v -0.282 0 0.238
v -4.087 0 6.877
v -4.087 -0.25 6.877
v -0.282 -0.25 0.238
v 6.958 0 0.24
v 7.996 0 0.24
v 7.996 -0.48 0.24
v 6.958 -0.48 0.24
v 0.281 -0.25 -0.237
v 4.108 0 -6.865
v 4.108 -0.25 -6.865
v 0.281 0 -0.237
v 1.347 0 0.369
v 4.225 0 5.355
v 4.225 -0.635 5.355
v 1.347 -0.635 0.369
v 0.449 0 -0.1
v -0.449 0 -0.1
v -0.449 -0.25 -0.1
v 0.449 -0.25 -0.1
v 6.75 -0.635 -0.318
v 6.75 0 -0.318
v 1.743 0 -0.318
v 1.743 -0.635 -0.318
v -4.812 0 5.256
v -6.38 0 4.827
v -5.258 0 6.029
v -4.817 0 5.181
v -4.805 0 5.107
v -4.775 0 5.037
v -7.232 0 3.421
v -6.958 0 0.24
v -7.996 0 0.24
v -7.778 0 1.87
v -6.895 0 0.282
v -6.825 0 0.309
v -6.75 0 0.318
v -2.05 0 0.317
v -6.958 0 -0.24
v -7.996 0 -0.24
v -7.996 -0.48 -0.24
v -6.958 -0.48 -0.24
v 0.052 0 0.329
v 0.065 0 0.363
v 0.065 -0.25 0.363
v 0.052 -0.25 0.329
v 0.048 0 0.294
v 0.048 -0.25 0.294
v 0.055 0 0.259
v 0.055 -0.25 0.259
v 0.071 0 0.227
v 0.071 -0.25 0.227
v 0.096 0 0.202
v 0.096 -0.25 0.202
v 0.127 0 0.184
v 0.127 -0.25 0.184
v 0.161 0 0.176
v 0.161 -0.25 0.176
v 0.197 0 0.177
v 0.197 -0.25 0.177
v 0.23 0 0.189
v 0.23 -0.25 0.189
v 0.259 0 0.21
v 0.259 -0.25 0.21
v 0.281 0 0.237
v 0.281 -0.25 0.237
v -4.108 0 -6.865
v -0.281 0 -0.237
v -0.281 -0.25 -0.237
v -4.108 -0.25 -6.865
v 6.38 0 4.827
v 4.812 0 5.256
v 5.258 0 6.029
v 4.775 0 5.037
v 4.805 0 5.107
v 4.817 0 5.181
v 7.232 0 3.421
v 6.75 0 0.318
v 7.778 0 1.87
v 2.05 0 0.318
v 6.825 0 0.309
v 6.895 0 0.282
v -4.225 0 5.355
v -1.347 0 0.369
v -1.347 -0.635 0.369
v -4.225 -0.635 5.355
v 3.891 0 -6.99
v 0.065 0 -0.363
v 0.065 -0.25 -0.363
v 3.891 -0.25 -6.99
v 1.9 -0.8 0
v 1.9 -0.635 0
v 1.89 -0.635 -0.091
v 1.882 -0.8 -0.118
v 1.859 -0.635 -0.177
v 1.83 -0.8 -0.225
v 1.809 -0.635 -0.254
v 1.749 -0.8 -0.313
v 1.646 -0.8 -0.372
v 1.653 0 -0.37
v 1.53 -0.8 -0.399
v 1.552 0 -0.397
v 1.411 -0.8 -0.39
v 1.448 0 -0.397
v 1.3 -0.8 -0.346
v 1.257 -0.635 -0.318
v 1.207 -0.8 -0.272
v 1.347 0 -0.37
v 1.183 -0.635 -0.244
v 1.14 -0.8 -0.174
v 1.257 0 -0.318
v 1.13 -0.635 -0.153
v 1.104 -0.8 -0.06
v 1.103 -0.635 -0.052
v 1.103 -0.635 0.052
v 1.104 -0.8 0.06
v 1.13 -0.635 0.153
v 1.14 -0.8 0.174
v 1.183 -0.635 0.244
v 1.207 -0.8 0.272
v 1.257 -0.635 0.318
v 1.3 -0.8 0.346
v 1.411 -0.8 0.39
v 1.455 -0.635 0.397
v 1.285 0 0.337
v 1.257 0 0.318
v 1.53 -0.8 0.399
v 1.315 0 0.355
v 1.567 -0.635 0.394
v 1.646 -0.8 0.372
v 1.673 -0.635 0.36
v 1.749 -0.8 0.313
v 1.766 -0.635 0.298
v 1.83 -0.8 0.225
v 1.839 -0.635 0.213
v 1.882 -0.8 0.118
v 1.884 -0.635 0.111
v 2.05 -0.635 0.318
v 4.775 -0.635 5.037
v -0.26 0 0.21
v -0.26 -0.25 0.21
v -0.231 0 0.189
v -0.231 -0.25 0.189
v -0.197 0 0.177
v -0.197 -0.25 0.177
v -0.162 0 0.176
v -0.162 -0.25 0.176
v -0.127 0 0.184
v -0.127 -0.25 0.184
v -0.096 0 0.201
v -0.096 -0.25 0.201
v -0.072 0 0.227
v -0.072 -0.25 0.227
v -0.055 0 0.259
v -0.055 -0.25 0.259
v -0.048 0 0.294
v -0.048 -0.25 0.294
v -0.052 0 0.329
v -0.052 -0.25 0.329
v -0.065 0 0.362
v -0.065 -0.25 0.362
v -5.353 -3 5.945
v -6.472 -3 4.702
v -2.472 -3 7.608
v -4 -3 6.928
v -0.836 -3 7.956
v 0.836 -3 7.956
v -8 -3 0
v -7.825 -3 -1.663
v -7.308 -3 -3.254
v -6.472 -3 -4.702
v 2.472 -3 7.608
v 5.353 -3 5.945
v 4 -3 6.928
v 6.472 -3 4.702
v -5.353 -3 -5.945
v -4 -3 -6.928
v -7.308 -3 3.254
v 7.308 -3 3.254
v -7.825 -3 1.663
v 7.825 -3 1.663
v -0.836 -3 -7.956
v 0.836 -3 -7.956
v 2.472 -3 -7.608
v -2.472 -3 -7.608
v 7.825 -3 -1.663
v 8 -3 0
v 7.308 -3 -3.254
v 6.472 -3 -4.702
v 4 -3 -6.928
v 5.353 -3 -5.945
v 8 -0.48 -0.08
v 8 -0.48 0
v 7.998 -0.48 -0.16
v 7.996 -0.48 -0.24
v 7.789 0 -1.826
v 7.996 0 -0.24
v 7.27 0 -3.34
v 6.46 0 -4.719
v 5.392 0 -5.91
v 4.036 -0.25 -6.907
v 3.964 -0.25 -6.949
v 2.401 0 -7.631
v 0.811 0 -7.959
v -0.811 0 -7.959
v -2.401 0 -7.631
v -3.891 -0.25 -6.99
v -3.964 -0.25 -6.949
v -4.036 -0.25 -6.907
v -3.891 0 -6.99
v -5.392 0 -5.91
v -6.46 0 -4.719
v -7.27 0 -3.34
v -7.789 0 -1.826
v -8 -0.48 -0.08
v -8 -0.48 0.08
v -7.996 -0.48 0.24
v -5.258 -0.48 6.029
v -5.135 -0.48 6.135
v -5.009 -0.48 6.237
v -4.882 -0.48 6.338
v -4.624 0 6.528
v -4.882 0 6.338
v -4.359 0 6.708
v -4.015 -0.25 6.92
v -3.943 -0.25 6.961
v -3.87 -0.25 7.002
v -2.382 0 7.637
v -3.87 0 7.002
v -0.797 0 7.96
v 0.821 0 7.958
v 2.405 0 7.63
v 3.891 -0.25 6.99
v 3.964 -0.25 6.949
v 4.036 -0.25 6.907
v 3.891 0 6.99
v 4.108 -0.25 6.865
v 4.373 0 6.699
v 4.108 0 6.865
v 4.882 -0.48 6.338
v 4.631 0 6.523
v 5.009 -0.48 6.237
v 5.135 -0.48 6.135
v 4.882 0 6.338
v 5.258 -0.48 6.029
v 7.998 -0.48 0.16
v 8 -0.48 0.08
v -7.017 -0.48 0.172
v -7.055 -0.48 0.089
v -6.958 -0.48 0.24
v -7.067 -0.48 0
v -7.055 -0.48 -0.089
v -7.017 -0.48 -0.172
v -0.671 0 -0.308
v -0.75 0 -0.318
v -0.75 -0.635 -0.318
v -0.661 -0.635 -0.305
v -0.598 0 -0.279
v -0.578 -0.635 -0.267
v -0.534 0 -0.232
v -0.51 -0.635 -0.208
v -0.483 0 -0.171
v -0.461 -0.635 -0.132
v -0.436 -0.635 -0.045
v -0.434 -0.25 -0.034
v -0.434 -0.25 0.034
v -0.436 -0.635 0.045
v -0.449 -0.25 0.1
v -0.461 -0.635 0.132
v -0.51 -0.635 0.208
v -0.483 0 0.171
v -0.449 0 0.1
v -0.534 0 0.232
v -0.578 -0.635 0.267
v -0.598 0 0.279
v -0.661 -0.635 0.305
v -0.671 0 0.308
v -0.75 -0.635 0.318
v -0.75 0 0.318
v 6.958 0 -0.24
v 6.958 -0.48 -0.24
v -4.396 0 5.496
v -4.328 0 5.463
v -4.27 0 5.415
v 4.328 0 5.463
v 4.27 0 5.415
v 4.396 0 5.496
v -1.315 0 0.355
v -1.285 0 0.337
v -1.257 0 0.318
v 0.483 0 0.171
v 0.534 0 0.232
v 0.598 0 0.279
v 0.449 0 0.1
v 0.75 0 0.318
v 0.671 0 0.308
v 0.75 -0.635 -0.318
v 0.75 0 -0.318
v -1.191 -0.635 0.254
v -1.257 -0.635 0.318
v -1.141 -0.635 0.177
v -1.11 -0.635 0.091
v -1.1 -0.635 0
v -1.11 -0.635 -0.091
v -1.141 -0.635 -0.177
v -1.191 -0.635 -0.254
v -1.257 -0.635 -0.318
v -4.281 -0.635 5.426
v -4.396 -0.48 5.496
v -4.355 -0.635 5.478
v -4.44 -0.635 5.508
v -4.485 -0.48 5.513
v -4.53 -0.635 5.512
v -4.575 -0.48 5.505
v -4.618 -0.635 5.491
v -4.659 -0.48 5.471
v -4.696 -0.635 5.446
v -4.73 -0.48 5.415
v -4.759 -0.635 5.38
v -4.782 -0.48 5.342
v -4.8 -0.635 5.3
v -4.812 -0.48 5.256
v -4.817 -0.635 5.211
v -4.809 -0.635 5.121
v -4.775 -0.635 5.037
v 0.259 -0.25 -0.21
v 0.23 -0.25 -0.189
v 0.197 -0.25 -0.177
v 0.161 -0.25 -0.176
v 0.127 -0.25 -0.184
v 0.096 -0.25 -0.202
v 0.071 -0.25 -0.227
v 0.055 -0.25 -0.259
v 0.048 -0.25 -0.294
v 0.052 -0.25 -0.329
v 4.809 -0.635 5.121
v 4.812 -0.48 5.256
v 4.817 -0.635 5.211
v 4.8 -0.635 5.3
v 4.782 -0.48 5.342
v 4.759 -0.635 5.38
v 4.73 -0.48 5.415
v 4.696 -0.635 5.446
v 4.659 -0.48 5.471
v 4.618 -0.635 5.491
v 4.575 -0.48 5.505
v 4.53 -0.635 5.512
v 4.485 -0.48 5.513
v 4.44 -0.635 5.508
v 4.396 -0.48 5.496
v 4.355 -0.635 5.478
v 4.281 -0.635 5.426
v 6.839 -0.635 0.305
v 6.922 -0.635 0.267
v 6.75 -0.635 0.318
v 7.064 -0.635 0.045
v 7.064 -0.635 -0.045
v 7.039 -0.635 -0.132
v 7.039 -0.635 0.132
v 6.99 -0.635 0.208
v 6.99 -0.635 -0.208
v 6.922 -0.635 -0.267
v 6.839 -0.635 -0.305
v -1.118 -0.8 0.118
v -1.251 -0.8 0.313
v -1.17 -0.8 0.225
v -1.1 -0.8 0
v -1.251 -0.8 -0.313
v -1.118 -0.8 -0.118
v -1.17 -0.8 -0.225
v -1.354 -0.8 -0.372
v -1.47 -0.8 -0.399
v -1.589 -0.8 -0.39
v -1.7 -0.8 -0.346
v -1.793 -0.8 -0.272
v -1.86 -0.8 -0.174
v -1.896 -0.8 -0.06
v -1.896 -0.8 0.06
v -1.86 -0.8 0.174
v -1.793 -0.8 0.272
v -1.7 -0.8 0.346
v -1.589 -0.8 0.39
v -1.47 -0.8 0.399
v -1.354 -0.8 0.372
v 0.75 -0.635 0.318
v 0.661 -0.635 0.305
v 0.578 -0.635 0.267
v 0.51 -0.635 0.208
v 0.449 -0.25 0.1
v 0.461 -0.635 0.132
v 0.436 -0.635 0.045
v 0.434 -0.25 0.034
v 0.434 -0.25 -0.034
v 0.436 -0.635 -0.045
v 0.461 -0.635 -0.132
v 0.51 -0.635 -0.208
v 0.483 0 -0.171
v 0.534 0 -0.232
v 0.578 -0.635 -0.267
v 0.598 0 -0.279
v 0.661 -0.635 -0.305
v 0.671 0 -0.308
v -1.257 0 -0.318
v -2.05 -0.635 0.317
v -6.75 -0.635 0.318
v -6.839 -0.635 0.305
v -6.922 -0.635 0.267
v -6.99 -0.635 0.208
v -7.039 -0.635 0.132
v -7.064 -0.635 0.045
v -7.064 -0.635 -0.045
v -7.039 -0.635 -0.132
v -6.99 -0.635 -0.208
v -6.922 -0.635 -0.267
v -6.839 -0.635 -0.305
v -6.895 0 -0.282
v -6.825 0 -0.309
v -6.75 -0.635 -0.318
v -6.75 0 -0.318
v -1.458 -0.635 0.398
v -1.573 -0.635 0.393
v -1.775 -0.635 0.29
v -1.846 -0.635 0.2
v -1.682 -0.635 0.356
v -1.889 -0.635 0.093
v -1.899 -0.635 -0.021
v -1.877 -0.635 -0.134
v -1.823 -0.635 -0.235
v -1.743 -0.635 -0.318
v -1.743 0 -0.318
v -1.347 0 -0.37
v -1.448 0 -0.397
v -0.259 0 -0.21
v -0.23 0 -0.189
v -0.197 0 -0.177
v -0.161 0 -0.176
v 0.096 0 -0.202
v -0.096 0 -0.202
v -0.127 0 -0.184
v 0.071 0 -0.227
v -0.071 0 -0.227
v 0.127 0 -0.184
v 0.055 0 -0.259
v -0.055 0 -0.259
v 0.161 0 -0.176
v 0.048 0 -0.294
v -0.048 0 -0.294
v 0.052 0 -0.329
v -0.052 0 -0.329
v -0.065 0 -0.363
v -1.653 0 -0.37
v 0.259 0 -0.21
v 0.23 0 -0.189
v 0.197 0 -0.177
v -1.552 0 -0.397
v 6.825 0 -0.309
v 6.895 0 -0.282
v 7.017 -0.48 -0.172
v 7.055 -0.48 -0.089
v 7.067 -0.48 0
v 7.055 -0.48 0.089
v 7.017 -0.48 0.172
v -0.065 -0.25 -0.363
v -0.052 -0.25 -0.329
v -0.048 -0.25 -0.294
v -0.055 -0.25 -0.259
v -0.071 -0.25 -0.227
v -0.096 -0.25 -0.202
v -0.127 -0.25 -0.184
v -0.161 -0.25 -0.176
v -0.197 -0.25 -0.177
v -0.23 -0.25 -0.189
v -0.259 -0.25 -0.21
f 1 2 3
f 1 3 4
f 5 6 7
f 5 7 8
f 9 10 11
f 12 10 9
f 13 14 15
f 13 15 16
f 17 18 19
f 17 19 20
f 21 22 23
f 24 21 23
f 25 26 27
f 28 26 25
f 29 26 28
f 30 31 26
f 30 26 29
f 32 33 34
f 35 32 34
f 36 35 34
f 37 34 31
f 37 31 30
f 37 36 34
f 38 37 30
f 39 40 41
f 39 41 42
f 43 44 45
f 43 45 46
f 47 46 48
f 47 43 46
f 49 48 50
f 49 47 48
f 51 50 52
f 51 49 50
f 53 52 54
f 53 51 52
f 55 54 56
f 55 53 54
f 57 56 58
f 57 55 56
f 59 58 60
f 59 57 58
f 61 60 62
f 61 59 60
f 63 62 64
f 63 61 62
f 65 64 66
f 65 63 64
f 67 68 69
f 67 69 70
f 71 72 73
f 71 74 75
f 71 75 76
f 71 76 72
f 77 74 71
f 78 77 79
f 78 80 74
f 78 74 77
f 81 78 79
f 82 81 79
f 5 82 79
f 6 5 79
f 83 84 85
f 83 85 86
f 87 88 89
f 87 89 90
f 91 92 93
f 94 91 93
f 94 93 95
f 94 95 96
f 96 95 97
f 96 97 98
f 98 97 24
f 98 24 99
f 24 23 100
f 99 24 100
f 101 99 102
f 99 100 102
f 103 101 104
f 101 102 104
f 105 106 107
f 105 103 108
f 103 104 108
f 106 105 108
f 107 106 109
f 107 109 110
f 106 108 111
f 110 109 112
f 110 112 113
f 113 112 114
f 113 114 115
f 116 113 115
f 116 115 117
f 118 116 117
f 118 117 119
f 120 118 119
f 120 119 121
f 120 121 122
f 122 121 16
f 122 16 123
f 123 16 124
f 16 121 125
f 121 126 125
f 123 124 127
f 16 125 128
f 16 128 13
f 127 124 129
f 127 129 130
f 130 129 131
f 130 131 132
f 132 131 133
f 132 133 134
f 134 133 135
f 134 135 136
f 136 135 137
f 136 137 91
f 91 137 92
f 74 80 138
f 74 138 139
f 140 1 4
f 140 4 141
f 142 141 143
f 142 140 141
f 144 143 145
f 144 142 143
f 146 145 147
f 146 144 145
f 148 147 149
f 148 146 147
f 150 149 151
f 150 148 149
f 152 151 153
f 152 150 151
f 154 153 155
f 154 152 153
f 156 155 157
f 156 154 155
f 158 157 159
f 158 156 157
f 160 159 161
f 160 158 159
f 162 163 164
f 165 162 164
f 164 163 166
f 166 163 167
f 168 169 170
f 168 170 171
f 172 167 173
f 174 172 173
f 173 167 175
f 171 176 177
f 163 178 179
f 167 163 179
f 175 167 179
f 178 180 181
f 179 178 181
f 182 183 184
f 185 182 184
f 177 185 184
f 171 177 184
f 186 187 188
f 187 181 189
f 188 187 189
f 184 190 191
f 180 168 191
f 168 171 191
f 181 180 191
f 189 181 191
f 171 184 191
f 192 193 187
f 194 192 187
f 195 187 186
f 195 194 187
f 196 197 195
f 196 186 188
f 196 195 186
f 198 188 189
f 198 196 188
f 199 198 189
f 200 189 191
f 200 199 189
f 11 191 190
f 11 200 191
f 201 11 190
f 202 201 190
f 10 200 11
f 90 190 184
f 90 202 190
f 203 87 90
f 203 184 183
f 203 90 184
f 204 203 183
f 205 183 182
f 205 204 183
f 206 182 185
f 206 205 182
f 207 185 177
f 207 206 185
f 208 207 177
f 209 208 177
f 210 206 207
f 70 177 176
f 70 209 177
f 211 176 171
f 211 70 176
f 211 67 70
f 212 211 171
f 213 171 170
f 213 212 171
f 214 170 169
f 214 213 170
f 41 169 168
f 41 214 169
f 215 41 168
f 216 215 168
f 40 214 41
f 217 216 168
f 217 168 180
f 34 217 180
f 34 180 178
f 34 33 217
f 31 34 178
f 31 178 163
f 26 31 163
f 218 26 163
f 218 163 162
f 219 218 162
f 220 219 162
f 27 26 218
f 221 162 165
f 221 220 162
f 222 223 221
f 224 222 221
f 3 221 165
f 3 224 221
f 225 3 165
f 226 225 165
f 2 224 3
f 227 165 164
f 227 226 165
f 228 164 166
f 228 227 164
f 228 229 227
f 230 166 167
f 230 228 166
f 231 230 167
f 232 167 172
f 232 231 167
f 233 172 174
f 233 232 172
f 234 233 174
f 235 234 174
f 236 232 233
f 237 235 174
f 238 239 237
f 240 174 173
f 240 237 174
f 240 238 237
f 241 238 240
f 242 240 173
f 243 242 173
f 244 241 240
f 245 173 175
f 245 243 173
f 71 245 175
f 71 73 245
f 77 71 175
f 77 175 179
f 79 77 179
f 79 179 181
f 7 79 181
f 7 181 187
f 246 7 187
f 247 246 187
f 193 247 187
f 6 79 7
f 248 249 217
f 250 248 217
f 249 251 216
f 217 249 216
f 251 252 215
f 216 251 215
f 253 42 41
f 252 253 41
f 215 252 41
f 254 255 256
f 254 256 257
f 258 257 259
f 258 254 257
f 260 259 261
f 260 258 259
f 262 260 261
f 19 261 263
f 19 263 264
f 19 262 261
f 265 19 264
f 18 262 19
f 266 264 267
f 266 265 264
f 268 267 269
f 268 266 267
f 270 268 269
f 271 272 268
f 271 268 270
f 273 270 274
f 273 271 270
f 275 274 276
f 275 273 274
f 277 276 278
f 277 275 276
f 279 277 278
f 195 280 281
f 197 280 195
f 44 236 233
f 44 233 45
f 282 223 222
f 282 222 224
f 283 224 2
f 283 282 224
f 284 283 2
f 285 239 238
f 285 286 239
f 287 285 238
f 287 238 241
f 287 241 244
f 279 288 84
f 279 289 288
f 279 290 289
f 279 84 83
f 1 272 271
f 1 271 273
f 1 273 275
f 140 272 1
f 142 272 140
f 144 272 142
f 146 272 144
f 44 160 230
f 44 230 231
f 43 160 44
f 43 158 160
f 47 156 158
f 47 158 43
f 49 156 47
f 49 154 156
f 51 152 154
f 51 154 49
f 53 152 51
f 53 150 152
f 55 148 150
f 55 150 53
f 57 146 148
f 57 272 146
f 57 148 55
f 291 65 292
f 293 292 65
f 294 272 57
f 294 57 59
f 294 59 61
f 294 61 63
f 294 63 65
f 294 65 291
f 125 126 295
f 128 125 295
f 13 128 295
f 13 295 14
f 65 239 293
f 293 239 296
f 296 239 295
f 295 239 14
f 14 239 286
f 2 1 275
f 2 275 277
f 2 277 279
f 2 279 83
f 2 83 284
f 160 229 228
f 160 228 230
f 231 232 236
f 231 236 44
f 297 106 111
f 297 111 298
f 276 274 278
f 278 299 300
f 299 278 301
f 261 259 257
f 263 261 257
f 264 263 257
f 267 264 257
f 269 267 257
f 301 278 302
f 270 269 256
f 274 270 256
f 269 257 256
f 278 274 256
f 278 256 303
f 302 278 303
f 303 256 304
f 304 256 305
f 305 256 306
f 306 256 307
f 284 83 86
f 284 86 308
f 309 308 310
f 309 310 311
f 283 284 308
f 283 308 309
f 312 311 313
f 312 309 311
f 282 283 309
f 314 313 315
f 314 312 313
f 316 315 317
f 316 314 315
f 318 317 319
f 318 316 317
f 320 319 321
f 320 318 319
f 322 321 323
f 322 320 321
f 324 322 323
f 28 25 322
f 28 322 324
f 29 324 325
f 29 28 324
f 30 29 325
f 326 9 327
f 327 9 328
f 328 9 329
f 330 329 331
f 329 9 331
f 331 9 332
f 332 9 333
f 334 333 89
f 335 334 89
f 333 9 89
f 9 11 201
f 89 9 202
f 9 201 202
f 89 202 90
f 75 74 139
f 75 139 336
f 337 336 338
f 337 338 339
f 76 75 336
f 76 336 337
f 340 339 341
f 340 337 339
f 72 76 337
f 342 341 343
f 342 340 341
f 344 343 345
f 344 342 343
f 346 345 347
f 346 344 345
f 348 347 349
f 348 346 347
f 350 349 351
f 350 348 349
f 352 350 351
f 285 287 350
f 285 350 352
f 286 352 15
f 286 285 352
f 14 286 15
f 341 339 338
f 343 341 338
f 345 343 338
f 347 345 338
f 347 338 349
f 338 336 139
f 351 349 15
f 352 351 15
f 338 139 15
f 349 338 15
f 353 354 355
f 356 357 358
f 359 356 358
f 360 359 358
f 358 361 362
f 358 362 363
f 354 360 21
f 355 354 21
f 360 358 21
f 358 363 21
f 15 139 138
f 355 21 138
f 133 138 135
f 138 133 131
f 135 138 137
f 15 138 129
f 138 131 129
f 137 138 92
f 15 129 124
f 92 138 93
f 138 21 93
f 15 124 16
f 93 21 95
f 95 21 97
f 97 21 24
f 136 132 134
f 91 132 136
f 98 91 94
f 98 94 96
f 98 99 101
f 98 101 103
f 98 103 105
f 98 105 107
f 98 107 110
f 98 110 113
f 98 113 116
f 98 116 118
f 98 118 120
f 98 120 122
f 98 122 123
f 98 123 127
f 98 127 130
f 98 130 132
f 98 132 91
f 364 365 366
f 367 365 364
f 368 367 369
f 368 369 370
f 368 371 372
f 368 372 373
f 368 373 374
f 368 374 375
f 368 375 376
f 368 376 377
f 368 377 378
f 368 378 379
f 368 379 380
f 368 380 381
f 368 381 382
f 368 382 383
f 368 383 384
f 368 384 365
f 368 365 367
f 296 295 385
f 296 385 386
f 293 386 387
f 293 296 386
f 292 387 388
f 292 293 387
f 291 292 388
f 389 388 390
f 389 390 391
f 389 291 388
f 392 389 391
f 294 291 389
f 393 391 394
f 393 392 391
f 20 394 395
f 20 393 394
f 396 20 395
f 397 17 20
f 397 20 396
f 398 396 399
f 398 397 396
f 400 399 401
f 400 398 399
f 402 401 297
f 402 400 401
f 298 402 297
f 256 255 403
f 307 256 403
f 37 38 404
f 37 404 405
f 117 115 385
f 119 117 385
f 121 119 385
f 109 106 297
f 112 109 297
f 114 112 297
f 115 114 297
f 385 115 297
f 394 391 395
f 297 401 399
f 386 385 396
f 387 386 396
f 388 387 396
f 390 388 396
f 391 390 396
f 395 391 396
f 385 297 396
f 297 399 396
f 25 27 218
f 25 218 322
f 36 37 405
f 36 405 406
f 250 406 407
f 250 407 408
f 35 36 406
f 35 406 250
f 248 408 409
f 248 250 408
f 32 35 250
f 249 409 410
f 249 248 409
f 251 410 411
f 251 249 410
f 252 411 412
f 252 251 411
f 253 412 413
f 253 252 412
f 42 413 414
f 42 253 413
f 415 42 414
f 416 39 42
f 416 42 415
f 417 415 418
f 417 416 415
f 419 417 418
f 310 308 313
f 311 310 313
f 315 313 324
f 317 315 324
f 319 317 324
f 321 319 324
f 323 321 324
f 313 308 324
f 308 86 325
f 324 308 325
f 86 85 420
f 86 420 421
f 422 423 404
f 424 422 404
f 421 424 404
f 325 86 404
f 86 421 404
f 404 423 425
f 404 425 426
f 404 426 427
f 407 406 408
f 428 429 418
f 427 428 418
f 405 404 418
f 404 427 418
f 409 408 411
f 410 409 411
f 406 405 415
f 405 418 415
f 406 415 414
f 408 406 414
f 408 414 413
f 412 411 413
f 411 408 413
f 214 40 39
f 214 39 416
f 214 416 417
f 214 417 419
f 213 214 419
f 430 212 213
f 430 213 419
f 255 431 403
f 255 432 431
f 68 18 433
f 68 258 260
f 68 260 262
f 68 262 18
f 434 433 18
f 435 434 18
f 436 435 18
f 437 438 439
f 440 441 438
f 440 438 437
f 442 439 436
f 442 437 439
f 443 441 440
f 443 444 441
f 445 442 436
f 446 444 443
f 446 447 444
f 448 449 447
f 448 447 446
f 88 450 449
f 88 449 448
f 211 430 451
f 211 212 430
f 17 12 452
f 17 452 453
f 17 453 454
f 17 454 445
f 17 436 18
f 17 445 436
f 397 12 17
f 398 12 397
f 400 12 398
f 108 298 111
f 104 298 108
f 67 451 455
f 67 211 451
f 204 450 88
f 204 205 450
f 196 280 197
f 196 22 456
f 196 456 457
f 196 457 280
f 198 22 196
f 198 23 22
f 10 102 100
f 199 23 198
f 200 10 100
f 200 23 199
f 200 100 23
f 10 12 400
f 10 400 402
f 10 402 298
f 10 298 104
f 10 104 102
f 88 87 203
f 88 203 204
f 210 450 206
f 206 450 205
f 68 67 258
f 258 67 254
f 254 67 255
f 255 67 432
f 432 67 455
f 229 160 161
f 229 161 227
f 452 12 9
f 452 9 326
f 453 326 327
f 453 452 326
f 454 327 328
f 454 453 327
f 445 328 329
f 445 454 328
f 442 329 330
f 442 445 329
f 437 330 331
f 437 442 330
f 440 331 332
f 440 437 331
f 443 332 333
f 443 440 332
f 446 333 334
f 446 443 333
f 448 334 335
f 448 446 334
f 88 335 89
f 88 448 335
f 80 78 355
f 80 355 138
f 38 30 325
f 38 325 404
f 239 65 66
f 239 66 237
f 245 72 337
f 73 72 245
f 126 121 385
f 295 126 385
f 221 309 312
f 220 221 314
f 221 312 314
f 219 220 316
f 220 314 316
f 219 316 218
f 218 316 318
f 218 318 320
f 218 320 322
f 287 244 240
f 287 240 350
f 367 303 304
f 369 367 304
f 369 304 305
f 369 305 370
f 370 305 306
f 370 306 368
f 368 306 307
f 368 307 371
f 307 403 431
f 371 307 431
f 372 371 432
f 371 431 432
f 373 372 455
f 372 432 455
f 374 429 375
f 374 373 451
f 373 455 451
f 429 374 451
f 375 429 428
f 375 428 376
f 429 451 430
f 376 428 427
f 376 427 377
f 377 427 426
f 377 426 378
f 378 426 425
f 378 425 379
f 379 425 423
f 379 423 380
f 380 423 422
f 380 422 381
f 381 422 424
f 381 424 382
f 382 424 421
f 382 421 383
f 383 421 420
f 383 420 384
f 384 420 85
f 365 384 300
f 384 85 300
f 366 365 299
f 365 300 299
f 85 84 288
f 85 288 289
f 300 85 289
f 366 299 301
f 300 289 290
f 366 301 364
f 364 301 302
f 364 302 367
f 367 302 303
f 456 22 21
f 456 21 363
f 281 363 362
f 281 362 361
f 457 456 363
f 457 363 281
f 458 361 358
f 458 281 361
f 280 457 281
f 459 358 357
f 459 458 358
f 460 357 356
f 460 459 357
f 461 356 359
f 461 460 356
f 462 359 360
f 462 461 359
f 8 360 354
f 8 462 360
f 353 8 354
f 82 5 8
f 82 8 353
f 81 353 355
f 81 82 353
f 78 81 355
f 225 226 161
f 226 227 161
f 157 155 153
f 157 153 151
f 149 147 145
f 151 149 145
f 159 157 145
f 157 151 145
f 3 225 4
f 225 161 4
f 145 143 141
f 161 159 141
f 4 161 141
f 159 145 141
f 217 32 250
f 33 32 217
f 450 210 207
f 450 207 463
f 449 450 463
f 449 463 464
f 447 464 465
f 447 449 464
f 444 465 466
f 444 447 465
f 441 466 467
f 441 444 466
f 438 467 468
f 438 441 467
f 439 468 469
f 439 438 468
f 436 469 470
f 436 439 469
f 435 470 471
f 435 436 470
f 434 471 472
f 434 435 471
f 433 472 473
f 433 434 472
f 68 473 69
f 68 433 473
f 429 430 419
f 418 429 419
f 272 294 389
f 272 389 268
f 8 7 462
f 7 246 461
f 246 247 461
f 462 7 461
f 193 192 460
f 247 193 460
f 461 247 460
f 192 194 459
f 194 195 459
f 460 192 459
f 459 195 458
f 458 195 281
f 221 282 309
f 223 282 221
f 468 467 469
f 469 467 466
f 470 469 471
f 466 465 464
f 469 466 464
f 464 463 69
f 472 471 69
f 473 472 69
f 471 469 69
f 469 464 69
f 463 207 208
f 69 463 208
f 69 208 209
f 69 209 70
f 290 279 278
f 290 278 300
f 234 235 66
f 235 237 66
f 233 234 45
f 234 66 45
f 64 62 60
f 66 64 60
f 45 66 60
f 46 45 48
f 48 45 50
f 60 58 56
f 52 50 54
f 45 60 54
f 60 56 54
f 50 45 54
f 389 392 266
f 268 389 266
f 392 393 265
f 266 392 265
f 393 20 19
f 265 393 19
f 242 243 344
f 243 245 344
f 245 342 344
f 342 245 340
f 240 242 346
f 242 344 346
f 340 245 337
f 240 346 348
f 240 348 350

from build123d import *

# Parameters (mm, degrees)
SKETCH1_R           = 8
BOSS_EXTRUDE1_DEPTH = 3
CUT_EXTRUDE1_DEPTH  = 0.25
SKETCH3_R           = 0.4
CUT_EXTRUDE2_DEPTH  = 0.8
CUT_EXTRUDE4_DEPTH  = 0.635
CUT_EXTRUDE6_DEPTH  = 0.48


with BuildPart() as part:
    # Sketch1 → Boss-Extrude1 (new body)
    with BuildSketch(Plane(origin=(0, 0, 0), x_dir=(1, 0, 0), z_dir=(0, 1, 0))):
        Circle(SKETCH1_R)
    extrude(amount=-BOSS_EXTRUDE1_DEPTH)

    # Sketch2 → Cut-Extrude1 (cut)
    with BuildSketch(Plane(origin=(0, 0, 0), x_dir=(1, 0, 0), z_dir=(0, 1, 0))):
        with BuildLine():
            Line((-0.75, 0.1), (0.75, 0.1))
            ThreePointArc((0.75, 0.1), (0.85, 0), (0.75, -0.1))
            Line((0.75, -0.1), (-0.75, -0.1))
            ThreePointArc((-0.75, -0.1), (-0.85, 0), (-0.75, 0.1))
        make_face()
        with BuildLine():
            Line((0.064947675, 0.362501474), (4.891747675, 8.722501474))
            ThreePointArc((4.891747675, 8.722501474), (5.062501474, 8.768252325), (5.108252325, 8.597498526))
            Line((5.108252325, 8.597498526), (0.281452325, 0.237498526))
            ThreePointArc((0.281452325, 0.237498526), (0.110698526, 0.191747675), (0.064947675, 0.362501474))
        make_face()
        with BuildLine():
            Line((0.281452325, -0.237498526), (5.108252325, -8.597498526))
            ThreePointArc((5.108252325, -8.597498526), (5.062501474, -8.768252325), (4.891747675, -8.722501474))
            Line((4.891747675, -8.722501474), (0.064947675, -0.362501474))
            ThreePointArc((0.064947675, -0.362501474), (0.110698526, -0.191747675), (0.281452325, -0.237498526))
        make_face()
        with BuildLine():
            Line((-0.064747026, -0.362152654), (-4.891547026, -8.784654127))
            ThreePointArc((-4.891547026, -8.784654127), (-5.062152654, -8.830954448), (-5.108452974, -8.66034882))
            Line((-5.108452974, -8.66034882), (-0.281652974, -0.237847346))
            ThreePointArc((-0.281652974, -0.237847346), (-0.111047346, -0.191547026), (-0.064747026, -0.362152654))
        make_face()
        with BuildLine():
            Line((-0.281452325, 0.237498526), (-5.108252325, 8.597498526))
            ThreePointArc((-5.108252325, 8.597498526), (-5.062501474, 8.768252325), (-4.891747675, 8.722501474))
            Line((-4.891747675, 8.722501474), (-0.064947675, 0.362501474))
            ThreePointArc((-0.064947675, 0.362501474), (-0.110698526, 0.191747675), (-0.281452325, 0.237498526))
        make_face()
    extrude(amount=-CUT_EXTRUDE1_DEPTH, mode=Mode.SUBTRACT)

    # Sketch3 → Cut-Extrude2 (cut)
    with BuildSketch(Plane(origin=(0, 0, 0), x_dir=(1, 0, 0), z_dir=(0, 1, 0))):
        with Locations((1.5, 0)):
            Circle(SKETCH3_R)
        with Locations((-1.5, 0)):
            Circle(SKETCH3_R)
    extrude(amount=-CUT_EXTRUDE2_DEPTH, mode=Mode.SUBTRACT)

    # Sketch4 → Cut-Extrude4 (cut)
    with BuildSketch(Plane(origin=(0, 0, 0), x_dir=(1, 0, 0), z_dir=(0, 1, 0))):
        with BuildLine():
            Line((-0.75, -0.3175), (-6.75, -0.3175))
            ThreePointArc((-6.75, -0.3175), (-7.0675, 0), (-6.75, 0.3175))
            Line((-6.75, 0.3175), (-0.75, 0.3175))
            ThreePointArc((-0.75, 0.3175), (-0.4325, 0), (-0.75, -0.3175))
        make_face()
        with BuildLine():
            Line((0.75, 0.3175), (6.75, 0.3175))
            ThreePointArc((6.75, 0.3175), (7.0675, 0), (6.75, -0.3175))
            Line((6.75, -0.3175), (0.75, -0.3175))
            ThreePointArc((0.75, -0.3175), (0.4325, 0), (0.75, 0.3175))
        make_face()
        with BuildLine():
            Line((-1.225038951, -0.158753493), (-4.225104953, -5.354867808))
            ThreePointArc((-4.225104953, -5.354867808), (-4.658819495, -5.471075365), (-4.775027051, -5.037360823))
            Line((-4.775027051, -5.037360823), (-1.774961049, 0.158753493))
            ThreePointArc((-1.774961049, 0.158753493), (-1.341246507, 0.274961049), (-1.225038951, -0.158753493))
        make_face()
        with BuildLine():
            Line((1.774961049, 0.158753493), (4.775027051, -5.037360823))
            ThreePointArc((4.775027051, -5.037360823), (4.658819495, -5.471075365), (4.225104953, -5.354867808))
            Line((4.225104953, -5.354867808), (1.225038951, -0.158753493))
            ThreePointArc((1.225038951, -0.158753493), (1.341246507, 0.274961049), (1.774961049, 0.158753493))
        make_face()
    extrude(amount=-CUT_EXTRUDE4_DEPTH, mode=Mode.SUBTRACT)

    # Sketch5 → Cut-Extrude6 (cut)
    with BuildSketch(Plane(origin=(0, 0, 0), x_dir=(1, 0, 0), z_dir=(0, 1, 0))):
        with BuildLine():
            Line((-6.75, -0.24), (-8.75, -0.24))
            ThreePointArc((-8.75, -0.24), (-8.99, 0), (-8.75, 0.24))
            Line((-8.75, 0.24), (-6.75, 0.24))
            ThreePointArc((-6.75, 0.24), (-6.51, 0), (-6.75, -0.24))
        make_face()
        with BuildLine():
            Line((6.75, 0.24), (8.75, 0.24))
            ThreePointArc((8.75, 0.24), (8.99, 0), (8.75, -0.24))
            Line((8.75, -0.24), (6.75, -0.24))
            ThreePointArc((6.75, -0.24), (6.51, 0), (6.75, 0.24))
        make_face()
        with BuildLine():
            Line((-4.29222143, -5.316116956), (-6.844144056, -9.736046945))
            ThreePointArc((-6.844144056, -9.736046945), (-7.171991269, -9.823888878), (-7.259833201, -9.496041665))
            Line((-7.259833201, -9.496041665), (-4.707910575, -5.076111676))
            ThreePointArc((-4.707910575, -5.076111676), (-4.380063362, -4.988269743), (-4.29222143, -5.316116956))
        make_face()
        with BuildLine():
            Line((4.707910575, -5.076111676), (7.190547612, -9.376039025))
            ThreePointArc((7.190547612, -9.376039025), (7.10270568, -9.703886238), (6.774858467, -9.616044305))
            Line((6.774858467, -9.616044305), (4.29222143, -5.316116956))
            ThreePointArc((4.29222143, -5.316116956), (4.380063362, -4.988269743), (4.707910575, -5.076111676))
        make_face()
    extrude(amount=-CUT_EXTRUDE6_DEPTH, mode=Mode.SUBTRACT)


solid = part.part
